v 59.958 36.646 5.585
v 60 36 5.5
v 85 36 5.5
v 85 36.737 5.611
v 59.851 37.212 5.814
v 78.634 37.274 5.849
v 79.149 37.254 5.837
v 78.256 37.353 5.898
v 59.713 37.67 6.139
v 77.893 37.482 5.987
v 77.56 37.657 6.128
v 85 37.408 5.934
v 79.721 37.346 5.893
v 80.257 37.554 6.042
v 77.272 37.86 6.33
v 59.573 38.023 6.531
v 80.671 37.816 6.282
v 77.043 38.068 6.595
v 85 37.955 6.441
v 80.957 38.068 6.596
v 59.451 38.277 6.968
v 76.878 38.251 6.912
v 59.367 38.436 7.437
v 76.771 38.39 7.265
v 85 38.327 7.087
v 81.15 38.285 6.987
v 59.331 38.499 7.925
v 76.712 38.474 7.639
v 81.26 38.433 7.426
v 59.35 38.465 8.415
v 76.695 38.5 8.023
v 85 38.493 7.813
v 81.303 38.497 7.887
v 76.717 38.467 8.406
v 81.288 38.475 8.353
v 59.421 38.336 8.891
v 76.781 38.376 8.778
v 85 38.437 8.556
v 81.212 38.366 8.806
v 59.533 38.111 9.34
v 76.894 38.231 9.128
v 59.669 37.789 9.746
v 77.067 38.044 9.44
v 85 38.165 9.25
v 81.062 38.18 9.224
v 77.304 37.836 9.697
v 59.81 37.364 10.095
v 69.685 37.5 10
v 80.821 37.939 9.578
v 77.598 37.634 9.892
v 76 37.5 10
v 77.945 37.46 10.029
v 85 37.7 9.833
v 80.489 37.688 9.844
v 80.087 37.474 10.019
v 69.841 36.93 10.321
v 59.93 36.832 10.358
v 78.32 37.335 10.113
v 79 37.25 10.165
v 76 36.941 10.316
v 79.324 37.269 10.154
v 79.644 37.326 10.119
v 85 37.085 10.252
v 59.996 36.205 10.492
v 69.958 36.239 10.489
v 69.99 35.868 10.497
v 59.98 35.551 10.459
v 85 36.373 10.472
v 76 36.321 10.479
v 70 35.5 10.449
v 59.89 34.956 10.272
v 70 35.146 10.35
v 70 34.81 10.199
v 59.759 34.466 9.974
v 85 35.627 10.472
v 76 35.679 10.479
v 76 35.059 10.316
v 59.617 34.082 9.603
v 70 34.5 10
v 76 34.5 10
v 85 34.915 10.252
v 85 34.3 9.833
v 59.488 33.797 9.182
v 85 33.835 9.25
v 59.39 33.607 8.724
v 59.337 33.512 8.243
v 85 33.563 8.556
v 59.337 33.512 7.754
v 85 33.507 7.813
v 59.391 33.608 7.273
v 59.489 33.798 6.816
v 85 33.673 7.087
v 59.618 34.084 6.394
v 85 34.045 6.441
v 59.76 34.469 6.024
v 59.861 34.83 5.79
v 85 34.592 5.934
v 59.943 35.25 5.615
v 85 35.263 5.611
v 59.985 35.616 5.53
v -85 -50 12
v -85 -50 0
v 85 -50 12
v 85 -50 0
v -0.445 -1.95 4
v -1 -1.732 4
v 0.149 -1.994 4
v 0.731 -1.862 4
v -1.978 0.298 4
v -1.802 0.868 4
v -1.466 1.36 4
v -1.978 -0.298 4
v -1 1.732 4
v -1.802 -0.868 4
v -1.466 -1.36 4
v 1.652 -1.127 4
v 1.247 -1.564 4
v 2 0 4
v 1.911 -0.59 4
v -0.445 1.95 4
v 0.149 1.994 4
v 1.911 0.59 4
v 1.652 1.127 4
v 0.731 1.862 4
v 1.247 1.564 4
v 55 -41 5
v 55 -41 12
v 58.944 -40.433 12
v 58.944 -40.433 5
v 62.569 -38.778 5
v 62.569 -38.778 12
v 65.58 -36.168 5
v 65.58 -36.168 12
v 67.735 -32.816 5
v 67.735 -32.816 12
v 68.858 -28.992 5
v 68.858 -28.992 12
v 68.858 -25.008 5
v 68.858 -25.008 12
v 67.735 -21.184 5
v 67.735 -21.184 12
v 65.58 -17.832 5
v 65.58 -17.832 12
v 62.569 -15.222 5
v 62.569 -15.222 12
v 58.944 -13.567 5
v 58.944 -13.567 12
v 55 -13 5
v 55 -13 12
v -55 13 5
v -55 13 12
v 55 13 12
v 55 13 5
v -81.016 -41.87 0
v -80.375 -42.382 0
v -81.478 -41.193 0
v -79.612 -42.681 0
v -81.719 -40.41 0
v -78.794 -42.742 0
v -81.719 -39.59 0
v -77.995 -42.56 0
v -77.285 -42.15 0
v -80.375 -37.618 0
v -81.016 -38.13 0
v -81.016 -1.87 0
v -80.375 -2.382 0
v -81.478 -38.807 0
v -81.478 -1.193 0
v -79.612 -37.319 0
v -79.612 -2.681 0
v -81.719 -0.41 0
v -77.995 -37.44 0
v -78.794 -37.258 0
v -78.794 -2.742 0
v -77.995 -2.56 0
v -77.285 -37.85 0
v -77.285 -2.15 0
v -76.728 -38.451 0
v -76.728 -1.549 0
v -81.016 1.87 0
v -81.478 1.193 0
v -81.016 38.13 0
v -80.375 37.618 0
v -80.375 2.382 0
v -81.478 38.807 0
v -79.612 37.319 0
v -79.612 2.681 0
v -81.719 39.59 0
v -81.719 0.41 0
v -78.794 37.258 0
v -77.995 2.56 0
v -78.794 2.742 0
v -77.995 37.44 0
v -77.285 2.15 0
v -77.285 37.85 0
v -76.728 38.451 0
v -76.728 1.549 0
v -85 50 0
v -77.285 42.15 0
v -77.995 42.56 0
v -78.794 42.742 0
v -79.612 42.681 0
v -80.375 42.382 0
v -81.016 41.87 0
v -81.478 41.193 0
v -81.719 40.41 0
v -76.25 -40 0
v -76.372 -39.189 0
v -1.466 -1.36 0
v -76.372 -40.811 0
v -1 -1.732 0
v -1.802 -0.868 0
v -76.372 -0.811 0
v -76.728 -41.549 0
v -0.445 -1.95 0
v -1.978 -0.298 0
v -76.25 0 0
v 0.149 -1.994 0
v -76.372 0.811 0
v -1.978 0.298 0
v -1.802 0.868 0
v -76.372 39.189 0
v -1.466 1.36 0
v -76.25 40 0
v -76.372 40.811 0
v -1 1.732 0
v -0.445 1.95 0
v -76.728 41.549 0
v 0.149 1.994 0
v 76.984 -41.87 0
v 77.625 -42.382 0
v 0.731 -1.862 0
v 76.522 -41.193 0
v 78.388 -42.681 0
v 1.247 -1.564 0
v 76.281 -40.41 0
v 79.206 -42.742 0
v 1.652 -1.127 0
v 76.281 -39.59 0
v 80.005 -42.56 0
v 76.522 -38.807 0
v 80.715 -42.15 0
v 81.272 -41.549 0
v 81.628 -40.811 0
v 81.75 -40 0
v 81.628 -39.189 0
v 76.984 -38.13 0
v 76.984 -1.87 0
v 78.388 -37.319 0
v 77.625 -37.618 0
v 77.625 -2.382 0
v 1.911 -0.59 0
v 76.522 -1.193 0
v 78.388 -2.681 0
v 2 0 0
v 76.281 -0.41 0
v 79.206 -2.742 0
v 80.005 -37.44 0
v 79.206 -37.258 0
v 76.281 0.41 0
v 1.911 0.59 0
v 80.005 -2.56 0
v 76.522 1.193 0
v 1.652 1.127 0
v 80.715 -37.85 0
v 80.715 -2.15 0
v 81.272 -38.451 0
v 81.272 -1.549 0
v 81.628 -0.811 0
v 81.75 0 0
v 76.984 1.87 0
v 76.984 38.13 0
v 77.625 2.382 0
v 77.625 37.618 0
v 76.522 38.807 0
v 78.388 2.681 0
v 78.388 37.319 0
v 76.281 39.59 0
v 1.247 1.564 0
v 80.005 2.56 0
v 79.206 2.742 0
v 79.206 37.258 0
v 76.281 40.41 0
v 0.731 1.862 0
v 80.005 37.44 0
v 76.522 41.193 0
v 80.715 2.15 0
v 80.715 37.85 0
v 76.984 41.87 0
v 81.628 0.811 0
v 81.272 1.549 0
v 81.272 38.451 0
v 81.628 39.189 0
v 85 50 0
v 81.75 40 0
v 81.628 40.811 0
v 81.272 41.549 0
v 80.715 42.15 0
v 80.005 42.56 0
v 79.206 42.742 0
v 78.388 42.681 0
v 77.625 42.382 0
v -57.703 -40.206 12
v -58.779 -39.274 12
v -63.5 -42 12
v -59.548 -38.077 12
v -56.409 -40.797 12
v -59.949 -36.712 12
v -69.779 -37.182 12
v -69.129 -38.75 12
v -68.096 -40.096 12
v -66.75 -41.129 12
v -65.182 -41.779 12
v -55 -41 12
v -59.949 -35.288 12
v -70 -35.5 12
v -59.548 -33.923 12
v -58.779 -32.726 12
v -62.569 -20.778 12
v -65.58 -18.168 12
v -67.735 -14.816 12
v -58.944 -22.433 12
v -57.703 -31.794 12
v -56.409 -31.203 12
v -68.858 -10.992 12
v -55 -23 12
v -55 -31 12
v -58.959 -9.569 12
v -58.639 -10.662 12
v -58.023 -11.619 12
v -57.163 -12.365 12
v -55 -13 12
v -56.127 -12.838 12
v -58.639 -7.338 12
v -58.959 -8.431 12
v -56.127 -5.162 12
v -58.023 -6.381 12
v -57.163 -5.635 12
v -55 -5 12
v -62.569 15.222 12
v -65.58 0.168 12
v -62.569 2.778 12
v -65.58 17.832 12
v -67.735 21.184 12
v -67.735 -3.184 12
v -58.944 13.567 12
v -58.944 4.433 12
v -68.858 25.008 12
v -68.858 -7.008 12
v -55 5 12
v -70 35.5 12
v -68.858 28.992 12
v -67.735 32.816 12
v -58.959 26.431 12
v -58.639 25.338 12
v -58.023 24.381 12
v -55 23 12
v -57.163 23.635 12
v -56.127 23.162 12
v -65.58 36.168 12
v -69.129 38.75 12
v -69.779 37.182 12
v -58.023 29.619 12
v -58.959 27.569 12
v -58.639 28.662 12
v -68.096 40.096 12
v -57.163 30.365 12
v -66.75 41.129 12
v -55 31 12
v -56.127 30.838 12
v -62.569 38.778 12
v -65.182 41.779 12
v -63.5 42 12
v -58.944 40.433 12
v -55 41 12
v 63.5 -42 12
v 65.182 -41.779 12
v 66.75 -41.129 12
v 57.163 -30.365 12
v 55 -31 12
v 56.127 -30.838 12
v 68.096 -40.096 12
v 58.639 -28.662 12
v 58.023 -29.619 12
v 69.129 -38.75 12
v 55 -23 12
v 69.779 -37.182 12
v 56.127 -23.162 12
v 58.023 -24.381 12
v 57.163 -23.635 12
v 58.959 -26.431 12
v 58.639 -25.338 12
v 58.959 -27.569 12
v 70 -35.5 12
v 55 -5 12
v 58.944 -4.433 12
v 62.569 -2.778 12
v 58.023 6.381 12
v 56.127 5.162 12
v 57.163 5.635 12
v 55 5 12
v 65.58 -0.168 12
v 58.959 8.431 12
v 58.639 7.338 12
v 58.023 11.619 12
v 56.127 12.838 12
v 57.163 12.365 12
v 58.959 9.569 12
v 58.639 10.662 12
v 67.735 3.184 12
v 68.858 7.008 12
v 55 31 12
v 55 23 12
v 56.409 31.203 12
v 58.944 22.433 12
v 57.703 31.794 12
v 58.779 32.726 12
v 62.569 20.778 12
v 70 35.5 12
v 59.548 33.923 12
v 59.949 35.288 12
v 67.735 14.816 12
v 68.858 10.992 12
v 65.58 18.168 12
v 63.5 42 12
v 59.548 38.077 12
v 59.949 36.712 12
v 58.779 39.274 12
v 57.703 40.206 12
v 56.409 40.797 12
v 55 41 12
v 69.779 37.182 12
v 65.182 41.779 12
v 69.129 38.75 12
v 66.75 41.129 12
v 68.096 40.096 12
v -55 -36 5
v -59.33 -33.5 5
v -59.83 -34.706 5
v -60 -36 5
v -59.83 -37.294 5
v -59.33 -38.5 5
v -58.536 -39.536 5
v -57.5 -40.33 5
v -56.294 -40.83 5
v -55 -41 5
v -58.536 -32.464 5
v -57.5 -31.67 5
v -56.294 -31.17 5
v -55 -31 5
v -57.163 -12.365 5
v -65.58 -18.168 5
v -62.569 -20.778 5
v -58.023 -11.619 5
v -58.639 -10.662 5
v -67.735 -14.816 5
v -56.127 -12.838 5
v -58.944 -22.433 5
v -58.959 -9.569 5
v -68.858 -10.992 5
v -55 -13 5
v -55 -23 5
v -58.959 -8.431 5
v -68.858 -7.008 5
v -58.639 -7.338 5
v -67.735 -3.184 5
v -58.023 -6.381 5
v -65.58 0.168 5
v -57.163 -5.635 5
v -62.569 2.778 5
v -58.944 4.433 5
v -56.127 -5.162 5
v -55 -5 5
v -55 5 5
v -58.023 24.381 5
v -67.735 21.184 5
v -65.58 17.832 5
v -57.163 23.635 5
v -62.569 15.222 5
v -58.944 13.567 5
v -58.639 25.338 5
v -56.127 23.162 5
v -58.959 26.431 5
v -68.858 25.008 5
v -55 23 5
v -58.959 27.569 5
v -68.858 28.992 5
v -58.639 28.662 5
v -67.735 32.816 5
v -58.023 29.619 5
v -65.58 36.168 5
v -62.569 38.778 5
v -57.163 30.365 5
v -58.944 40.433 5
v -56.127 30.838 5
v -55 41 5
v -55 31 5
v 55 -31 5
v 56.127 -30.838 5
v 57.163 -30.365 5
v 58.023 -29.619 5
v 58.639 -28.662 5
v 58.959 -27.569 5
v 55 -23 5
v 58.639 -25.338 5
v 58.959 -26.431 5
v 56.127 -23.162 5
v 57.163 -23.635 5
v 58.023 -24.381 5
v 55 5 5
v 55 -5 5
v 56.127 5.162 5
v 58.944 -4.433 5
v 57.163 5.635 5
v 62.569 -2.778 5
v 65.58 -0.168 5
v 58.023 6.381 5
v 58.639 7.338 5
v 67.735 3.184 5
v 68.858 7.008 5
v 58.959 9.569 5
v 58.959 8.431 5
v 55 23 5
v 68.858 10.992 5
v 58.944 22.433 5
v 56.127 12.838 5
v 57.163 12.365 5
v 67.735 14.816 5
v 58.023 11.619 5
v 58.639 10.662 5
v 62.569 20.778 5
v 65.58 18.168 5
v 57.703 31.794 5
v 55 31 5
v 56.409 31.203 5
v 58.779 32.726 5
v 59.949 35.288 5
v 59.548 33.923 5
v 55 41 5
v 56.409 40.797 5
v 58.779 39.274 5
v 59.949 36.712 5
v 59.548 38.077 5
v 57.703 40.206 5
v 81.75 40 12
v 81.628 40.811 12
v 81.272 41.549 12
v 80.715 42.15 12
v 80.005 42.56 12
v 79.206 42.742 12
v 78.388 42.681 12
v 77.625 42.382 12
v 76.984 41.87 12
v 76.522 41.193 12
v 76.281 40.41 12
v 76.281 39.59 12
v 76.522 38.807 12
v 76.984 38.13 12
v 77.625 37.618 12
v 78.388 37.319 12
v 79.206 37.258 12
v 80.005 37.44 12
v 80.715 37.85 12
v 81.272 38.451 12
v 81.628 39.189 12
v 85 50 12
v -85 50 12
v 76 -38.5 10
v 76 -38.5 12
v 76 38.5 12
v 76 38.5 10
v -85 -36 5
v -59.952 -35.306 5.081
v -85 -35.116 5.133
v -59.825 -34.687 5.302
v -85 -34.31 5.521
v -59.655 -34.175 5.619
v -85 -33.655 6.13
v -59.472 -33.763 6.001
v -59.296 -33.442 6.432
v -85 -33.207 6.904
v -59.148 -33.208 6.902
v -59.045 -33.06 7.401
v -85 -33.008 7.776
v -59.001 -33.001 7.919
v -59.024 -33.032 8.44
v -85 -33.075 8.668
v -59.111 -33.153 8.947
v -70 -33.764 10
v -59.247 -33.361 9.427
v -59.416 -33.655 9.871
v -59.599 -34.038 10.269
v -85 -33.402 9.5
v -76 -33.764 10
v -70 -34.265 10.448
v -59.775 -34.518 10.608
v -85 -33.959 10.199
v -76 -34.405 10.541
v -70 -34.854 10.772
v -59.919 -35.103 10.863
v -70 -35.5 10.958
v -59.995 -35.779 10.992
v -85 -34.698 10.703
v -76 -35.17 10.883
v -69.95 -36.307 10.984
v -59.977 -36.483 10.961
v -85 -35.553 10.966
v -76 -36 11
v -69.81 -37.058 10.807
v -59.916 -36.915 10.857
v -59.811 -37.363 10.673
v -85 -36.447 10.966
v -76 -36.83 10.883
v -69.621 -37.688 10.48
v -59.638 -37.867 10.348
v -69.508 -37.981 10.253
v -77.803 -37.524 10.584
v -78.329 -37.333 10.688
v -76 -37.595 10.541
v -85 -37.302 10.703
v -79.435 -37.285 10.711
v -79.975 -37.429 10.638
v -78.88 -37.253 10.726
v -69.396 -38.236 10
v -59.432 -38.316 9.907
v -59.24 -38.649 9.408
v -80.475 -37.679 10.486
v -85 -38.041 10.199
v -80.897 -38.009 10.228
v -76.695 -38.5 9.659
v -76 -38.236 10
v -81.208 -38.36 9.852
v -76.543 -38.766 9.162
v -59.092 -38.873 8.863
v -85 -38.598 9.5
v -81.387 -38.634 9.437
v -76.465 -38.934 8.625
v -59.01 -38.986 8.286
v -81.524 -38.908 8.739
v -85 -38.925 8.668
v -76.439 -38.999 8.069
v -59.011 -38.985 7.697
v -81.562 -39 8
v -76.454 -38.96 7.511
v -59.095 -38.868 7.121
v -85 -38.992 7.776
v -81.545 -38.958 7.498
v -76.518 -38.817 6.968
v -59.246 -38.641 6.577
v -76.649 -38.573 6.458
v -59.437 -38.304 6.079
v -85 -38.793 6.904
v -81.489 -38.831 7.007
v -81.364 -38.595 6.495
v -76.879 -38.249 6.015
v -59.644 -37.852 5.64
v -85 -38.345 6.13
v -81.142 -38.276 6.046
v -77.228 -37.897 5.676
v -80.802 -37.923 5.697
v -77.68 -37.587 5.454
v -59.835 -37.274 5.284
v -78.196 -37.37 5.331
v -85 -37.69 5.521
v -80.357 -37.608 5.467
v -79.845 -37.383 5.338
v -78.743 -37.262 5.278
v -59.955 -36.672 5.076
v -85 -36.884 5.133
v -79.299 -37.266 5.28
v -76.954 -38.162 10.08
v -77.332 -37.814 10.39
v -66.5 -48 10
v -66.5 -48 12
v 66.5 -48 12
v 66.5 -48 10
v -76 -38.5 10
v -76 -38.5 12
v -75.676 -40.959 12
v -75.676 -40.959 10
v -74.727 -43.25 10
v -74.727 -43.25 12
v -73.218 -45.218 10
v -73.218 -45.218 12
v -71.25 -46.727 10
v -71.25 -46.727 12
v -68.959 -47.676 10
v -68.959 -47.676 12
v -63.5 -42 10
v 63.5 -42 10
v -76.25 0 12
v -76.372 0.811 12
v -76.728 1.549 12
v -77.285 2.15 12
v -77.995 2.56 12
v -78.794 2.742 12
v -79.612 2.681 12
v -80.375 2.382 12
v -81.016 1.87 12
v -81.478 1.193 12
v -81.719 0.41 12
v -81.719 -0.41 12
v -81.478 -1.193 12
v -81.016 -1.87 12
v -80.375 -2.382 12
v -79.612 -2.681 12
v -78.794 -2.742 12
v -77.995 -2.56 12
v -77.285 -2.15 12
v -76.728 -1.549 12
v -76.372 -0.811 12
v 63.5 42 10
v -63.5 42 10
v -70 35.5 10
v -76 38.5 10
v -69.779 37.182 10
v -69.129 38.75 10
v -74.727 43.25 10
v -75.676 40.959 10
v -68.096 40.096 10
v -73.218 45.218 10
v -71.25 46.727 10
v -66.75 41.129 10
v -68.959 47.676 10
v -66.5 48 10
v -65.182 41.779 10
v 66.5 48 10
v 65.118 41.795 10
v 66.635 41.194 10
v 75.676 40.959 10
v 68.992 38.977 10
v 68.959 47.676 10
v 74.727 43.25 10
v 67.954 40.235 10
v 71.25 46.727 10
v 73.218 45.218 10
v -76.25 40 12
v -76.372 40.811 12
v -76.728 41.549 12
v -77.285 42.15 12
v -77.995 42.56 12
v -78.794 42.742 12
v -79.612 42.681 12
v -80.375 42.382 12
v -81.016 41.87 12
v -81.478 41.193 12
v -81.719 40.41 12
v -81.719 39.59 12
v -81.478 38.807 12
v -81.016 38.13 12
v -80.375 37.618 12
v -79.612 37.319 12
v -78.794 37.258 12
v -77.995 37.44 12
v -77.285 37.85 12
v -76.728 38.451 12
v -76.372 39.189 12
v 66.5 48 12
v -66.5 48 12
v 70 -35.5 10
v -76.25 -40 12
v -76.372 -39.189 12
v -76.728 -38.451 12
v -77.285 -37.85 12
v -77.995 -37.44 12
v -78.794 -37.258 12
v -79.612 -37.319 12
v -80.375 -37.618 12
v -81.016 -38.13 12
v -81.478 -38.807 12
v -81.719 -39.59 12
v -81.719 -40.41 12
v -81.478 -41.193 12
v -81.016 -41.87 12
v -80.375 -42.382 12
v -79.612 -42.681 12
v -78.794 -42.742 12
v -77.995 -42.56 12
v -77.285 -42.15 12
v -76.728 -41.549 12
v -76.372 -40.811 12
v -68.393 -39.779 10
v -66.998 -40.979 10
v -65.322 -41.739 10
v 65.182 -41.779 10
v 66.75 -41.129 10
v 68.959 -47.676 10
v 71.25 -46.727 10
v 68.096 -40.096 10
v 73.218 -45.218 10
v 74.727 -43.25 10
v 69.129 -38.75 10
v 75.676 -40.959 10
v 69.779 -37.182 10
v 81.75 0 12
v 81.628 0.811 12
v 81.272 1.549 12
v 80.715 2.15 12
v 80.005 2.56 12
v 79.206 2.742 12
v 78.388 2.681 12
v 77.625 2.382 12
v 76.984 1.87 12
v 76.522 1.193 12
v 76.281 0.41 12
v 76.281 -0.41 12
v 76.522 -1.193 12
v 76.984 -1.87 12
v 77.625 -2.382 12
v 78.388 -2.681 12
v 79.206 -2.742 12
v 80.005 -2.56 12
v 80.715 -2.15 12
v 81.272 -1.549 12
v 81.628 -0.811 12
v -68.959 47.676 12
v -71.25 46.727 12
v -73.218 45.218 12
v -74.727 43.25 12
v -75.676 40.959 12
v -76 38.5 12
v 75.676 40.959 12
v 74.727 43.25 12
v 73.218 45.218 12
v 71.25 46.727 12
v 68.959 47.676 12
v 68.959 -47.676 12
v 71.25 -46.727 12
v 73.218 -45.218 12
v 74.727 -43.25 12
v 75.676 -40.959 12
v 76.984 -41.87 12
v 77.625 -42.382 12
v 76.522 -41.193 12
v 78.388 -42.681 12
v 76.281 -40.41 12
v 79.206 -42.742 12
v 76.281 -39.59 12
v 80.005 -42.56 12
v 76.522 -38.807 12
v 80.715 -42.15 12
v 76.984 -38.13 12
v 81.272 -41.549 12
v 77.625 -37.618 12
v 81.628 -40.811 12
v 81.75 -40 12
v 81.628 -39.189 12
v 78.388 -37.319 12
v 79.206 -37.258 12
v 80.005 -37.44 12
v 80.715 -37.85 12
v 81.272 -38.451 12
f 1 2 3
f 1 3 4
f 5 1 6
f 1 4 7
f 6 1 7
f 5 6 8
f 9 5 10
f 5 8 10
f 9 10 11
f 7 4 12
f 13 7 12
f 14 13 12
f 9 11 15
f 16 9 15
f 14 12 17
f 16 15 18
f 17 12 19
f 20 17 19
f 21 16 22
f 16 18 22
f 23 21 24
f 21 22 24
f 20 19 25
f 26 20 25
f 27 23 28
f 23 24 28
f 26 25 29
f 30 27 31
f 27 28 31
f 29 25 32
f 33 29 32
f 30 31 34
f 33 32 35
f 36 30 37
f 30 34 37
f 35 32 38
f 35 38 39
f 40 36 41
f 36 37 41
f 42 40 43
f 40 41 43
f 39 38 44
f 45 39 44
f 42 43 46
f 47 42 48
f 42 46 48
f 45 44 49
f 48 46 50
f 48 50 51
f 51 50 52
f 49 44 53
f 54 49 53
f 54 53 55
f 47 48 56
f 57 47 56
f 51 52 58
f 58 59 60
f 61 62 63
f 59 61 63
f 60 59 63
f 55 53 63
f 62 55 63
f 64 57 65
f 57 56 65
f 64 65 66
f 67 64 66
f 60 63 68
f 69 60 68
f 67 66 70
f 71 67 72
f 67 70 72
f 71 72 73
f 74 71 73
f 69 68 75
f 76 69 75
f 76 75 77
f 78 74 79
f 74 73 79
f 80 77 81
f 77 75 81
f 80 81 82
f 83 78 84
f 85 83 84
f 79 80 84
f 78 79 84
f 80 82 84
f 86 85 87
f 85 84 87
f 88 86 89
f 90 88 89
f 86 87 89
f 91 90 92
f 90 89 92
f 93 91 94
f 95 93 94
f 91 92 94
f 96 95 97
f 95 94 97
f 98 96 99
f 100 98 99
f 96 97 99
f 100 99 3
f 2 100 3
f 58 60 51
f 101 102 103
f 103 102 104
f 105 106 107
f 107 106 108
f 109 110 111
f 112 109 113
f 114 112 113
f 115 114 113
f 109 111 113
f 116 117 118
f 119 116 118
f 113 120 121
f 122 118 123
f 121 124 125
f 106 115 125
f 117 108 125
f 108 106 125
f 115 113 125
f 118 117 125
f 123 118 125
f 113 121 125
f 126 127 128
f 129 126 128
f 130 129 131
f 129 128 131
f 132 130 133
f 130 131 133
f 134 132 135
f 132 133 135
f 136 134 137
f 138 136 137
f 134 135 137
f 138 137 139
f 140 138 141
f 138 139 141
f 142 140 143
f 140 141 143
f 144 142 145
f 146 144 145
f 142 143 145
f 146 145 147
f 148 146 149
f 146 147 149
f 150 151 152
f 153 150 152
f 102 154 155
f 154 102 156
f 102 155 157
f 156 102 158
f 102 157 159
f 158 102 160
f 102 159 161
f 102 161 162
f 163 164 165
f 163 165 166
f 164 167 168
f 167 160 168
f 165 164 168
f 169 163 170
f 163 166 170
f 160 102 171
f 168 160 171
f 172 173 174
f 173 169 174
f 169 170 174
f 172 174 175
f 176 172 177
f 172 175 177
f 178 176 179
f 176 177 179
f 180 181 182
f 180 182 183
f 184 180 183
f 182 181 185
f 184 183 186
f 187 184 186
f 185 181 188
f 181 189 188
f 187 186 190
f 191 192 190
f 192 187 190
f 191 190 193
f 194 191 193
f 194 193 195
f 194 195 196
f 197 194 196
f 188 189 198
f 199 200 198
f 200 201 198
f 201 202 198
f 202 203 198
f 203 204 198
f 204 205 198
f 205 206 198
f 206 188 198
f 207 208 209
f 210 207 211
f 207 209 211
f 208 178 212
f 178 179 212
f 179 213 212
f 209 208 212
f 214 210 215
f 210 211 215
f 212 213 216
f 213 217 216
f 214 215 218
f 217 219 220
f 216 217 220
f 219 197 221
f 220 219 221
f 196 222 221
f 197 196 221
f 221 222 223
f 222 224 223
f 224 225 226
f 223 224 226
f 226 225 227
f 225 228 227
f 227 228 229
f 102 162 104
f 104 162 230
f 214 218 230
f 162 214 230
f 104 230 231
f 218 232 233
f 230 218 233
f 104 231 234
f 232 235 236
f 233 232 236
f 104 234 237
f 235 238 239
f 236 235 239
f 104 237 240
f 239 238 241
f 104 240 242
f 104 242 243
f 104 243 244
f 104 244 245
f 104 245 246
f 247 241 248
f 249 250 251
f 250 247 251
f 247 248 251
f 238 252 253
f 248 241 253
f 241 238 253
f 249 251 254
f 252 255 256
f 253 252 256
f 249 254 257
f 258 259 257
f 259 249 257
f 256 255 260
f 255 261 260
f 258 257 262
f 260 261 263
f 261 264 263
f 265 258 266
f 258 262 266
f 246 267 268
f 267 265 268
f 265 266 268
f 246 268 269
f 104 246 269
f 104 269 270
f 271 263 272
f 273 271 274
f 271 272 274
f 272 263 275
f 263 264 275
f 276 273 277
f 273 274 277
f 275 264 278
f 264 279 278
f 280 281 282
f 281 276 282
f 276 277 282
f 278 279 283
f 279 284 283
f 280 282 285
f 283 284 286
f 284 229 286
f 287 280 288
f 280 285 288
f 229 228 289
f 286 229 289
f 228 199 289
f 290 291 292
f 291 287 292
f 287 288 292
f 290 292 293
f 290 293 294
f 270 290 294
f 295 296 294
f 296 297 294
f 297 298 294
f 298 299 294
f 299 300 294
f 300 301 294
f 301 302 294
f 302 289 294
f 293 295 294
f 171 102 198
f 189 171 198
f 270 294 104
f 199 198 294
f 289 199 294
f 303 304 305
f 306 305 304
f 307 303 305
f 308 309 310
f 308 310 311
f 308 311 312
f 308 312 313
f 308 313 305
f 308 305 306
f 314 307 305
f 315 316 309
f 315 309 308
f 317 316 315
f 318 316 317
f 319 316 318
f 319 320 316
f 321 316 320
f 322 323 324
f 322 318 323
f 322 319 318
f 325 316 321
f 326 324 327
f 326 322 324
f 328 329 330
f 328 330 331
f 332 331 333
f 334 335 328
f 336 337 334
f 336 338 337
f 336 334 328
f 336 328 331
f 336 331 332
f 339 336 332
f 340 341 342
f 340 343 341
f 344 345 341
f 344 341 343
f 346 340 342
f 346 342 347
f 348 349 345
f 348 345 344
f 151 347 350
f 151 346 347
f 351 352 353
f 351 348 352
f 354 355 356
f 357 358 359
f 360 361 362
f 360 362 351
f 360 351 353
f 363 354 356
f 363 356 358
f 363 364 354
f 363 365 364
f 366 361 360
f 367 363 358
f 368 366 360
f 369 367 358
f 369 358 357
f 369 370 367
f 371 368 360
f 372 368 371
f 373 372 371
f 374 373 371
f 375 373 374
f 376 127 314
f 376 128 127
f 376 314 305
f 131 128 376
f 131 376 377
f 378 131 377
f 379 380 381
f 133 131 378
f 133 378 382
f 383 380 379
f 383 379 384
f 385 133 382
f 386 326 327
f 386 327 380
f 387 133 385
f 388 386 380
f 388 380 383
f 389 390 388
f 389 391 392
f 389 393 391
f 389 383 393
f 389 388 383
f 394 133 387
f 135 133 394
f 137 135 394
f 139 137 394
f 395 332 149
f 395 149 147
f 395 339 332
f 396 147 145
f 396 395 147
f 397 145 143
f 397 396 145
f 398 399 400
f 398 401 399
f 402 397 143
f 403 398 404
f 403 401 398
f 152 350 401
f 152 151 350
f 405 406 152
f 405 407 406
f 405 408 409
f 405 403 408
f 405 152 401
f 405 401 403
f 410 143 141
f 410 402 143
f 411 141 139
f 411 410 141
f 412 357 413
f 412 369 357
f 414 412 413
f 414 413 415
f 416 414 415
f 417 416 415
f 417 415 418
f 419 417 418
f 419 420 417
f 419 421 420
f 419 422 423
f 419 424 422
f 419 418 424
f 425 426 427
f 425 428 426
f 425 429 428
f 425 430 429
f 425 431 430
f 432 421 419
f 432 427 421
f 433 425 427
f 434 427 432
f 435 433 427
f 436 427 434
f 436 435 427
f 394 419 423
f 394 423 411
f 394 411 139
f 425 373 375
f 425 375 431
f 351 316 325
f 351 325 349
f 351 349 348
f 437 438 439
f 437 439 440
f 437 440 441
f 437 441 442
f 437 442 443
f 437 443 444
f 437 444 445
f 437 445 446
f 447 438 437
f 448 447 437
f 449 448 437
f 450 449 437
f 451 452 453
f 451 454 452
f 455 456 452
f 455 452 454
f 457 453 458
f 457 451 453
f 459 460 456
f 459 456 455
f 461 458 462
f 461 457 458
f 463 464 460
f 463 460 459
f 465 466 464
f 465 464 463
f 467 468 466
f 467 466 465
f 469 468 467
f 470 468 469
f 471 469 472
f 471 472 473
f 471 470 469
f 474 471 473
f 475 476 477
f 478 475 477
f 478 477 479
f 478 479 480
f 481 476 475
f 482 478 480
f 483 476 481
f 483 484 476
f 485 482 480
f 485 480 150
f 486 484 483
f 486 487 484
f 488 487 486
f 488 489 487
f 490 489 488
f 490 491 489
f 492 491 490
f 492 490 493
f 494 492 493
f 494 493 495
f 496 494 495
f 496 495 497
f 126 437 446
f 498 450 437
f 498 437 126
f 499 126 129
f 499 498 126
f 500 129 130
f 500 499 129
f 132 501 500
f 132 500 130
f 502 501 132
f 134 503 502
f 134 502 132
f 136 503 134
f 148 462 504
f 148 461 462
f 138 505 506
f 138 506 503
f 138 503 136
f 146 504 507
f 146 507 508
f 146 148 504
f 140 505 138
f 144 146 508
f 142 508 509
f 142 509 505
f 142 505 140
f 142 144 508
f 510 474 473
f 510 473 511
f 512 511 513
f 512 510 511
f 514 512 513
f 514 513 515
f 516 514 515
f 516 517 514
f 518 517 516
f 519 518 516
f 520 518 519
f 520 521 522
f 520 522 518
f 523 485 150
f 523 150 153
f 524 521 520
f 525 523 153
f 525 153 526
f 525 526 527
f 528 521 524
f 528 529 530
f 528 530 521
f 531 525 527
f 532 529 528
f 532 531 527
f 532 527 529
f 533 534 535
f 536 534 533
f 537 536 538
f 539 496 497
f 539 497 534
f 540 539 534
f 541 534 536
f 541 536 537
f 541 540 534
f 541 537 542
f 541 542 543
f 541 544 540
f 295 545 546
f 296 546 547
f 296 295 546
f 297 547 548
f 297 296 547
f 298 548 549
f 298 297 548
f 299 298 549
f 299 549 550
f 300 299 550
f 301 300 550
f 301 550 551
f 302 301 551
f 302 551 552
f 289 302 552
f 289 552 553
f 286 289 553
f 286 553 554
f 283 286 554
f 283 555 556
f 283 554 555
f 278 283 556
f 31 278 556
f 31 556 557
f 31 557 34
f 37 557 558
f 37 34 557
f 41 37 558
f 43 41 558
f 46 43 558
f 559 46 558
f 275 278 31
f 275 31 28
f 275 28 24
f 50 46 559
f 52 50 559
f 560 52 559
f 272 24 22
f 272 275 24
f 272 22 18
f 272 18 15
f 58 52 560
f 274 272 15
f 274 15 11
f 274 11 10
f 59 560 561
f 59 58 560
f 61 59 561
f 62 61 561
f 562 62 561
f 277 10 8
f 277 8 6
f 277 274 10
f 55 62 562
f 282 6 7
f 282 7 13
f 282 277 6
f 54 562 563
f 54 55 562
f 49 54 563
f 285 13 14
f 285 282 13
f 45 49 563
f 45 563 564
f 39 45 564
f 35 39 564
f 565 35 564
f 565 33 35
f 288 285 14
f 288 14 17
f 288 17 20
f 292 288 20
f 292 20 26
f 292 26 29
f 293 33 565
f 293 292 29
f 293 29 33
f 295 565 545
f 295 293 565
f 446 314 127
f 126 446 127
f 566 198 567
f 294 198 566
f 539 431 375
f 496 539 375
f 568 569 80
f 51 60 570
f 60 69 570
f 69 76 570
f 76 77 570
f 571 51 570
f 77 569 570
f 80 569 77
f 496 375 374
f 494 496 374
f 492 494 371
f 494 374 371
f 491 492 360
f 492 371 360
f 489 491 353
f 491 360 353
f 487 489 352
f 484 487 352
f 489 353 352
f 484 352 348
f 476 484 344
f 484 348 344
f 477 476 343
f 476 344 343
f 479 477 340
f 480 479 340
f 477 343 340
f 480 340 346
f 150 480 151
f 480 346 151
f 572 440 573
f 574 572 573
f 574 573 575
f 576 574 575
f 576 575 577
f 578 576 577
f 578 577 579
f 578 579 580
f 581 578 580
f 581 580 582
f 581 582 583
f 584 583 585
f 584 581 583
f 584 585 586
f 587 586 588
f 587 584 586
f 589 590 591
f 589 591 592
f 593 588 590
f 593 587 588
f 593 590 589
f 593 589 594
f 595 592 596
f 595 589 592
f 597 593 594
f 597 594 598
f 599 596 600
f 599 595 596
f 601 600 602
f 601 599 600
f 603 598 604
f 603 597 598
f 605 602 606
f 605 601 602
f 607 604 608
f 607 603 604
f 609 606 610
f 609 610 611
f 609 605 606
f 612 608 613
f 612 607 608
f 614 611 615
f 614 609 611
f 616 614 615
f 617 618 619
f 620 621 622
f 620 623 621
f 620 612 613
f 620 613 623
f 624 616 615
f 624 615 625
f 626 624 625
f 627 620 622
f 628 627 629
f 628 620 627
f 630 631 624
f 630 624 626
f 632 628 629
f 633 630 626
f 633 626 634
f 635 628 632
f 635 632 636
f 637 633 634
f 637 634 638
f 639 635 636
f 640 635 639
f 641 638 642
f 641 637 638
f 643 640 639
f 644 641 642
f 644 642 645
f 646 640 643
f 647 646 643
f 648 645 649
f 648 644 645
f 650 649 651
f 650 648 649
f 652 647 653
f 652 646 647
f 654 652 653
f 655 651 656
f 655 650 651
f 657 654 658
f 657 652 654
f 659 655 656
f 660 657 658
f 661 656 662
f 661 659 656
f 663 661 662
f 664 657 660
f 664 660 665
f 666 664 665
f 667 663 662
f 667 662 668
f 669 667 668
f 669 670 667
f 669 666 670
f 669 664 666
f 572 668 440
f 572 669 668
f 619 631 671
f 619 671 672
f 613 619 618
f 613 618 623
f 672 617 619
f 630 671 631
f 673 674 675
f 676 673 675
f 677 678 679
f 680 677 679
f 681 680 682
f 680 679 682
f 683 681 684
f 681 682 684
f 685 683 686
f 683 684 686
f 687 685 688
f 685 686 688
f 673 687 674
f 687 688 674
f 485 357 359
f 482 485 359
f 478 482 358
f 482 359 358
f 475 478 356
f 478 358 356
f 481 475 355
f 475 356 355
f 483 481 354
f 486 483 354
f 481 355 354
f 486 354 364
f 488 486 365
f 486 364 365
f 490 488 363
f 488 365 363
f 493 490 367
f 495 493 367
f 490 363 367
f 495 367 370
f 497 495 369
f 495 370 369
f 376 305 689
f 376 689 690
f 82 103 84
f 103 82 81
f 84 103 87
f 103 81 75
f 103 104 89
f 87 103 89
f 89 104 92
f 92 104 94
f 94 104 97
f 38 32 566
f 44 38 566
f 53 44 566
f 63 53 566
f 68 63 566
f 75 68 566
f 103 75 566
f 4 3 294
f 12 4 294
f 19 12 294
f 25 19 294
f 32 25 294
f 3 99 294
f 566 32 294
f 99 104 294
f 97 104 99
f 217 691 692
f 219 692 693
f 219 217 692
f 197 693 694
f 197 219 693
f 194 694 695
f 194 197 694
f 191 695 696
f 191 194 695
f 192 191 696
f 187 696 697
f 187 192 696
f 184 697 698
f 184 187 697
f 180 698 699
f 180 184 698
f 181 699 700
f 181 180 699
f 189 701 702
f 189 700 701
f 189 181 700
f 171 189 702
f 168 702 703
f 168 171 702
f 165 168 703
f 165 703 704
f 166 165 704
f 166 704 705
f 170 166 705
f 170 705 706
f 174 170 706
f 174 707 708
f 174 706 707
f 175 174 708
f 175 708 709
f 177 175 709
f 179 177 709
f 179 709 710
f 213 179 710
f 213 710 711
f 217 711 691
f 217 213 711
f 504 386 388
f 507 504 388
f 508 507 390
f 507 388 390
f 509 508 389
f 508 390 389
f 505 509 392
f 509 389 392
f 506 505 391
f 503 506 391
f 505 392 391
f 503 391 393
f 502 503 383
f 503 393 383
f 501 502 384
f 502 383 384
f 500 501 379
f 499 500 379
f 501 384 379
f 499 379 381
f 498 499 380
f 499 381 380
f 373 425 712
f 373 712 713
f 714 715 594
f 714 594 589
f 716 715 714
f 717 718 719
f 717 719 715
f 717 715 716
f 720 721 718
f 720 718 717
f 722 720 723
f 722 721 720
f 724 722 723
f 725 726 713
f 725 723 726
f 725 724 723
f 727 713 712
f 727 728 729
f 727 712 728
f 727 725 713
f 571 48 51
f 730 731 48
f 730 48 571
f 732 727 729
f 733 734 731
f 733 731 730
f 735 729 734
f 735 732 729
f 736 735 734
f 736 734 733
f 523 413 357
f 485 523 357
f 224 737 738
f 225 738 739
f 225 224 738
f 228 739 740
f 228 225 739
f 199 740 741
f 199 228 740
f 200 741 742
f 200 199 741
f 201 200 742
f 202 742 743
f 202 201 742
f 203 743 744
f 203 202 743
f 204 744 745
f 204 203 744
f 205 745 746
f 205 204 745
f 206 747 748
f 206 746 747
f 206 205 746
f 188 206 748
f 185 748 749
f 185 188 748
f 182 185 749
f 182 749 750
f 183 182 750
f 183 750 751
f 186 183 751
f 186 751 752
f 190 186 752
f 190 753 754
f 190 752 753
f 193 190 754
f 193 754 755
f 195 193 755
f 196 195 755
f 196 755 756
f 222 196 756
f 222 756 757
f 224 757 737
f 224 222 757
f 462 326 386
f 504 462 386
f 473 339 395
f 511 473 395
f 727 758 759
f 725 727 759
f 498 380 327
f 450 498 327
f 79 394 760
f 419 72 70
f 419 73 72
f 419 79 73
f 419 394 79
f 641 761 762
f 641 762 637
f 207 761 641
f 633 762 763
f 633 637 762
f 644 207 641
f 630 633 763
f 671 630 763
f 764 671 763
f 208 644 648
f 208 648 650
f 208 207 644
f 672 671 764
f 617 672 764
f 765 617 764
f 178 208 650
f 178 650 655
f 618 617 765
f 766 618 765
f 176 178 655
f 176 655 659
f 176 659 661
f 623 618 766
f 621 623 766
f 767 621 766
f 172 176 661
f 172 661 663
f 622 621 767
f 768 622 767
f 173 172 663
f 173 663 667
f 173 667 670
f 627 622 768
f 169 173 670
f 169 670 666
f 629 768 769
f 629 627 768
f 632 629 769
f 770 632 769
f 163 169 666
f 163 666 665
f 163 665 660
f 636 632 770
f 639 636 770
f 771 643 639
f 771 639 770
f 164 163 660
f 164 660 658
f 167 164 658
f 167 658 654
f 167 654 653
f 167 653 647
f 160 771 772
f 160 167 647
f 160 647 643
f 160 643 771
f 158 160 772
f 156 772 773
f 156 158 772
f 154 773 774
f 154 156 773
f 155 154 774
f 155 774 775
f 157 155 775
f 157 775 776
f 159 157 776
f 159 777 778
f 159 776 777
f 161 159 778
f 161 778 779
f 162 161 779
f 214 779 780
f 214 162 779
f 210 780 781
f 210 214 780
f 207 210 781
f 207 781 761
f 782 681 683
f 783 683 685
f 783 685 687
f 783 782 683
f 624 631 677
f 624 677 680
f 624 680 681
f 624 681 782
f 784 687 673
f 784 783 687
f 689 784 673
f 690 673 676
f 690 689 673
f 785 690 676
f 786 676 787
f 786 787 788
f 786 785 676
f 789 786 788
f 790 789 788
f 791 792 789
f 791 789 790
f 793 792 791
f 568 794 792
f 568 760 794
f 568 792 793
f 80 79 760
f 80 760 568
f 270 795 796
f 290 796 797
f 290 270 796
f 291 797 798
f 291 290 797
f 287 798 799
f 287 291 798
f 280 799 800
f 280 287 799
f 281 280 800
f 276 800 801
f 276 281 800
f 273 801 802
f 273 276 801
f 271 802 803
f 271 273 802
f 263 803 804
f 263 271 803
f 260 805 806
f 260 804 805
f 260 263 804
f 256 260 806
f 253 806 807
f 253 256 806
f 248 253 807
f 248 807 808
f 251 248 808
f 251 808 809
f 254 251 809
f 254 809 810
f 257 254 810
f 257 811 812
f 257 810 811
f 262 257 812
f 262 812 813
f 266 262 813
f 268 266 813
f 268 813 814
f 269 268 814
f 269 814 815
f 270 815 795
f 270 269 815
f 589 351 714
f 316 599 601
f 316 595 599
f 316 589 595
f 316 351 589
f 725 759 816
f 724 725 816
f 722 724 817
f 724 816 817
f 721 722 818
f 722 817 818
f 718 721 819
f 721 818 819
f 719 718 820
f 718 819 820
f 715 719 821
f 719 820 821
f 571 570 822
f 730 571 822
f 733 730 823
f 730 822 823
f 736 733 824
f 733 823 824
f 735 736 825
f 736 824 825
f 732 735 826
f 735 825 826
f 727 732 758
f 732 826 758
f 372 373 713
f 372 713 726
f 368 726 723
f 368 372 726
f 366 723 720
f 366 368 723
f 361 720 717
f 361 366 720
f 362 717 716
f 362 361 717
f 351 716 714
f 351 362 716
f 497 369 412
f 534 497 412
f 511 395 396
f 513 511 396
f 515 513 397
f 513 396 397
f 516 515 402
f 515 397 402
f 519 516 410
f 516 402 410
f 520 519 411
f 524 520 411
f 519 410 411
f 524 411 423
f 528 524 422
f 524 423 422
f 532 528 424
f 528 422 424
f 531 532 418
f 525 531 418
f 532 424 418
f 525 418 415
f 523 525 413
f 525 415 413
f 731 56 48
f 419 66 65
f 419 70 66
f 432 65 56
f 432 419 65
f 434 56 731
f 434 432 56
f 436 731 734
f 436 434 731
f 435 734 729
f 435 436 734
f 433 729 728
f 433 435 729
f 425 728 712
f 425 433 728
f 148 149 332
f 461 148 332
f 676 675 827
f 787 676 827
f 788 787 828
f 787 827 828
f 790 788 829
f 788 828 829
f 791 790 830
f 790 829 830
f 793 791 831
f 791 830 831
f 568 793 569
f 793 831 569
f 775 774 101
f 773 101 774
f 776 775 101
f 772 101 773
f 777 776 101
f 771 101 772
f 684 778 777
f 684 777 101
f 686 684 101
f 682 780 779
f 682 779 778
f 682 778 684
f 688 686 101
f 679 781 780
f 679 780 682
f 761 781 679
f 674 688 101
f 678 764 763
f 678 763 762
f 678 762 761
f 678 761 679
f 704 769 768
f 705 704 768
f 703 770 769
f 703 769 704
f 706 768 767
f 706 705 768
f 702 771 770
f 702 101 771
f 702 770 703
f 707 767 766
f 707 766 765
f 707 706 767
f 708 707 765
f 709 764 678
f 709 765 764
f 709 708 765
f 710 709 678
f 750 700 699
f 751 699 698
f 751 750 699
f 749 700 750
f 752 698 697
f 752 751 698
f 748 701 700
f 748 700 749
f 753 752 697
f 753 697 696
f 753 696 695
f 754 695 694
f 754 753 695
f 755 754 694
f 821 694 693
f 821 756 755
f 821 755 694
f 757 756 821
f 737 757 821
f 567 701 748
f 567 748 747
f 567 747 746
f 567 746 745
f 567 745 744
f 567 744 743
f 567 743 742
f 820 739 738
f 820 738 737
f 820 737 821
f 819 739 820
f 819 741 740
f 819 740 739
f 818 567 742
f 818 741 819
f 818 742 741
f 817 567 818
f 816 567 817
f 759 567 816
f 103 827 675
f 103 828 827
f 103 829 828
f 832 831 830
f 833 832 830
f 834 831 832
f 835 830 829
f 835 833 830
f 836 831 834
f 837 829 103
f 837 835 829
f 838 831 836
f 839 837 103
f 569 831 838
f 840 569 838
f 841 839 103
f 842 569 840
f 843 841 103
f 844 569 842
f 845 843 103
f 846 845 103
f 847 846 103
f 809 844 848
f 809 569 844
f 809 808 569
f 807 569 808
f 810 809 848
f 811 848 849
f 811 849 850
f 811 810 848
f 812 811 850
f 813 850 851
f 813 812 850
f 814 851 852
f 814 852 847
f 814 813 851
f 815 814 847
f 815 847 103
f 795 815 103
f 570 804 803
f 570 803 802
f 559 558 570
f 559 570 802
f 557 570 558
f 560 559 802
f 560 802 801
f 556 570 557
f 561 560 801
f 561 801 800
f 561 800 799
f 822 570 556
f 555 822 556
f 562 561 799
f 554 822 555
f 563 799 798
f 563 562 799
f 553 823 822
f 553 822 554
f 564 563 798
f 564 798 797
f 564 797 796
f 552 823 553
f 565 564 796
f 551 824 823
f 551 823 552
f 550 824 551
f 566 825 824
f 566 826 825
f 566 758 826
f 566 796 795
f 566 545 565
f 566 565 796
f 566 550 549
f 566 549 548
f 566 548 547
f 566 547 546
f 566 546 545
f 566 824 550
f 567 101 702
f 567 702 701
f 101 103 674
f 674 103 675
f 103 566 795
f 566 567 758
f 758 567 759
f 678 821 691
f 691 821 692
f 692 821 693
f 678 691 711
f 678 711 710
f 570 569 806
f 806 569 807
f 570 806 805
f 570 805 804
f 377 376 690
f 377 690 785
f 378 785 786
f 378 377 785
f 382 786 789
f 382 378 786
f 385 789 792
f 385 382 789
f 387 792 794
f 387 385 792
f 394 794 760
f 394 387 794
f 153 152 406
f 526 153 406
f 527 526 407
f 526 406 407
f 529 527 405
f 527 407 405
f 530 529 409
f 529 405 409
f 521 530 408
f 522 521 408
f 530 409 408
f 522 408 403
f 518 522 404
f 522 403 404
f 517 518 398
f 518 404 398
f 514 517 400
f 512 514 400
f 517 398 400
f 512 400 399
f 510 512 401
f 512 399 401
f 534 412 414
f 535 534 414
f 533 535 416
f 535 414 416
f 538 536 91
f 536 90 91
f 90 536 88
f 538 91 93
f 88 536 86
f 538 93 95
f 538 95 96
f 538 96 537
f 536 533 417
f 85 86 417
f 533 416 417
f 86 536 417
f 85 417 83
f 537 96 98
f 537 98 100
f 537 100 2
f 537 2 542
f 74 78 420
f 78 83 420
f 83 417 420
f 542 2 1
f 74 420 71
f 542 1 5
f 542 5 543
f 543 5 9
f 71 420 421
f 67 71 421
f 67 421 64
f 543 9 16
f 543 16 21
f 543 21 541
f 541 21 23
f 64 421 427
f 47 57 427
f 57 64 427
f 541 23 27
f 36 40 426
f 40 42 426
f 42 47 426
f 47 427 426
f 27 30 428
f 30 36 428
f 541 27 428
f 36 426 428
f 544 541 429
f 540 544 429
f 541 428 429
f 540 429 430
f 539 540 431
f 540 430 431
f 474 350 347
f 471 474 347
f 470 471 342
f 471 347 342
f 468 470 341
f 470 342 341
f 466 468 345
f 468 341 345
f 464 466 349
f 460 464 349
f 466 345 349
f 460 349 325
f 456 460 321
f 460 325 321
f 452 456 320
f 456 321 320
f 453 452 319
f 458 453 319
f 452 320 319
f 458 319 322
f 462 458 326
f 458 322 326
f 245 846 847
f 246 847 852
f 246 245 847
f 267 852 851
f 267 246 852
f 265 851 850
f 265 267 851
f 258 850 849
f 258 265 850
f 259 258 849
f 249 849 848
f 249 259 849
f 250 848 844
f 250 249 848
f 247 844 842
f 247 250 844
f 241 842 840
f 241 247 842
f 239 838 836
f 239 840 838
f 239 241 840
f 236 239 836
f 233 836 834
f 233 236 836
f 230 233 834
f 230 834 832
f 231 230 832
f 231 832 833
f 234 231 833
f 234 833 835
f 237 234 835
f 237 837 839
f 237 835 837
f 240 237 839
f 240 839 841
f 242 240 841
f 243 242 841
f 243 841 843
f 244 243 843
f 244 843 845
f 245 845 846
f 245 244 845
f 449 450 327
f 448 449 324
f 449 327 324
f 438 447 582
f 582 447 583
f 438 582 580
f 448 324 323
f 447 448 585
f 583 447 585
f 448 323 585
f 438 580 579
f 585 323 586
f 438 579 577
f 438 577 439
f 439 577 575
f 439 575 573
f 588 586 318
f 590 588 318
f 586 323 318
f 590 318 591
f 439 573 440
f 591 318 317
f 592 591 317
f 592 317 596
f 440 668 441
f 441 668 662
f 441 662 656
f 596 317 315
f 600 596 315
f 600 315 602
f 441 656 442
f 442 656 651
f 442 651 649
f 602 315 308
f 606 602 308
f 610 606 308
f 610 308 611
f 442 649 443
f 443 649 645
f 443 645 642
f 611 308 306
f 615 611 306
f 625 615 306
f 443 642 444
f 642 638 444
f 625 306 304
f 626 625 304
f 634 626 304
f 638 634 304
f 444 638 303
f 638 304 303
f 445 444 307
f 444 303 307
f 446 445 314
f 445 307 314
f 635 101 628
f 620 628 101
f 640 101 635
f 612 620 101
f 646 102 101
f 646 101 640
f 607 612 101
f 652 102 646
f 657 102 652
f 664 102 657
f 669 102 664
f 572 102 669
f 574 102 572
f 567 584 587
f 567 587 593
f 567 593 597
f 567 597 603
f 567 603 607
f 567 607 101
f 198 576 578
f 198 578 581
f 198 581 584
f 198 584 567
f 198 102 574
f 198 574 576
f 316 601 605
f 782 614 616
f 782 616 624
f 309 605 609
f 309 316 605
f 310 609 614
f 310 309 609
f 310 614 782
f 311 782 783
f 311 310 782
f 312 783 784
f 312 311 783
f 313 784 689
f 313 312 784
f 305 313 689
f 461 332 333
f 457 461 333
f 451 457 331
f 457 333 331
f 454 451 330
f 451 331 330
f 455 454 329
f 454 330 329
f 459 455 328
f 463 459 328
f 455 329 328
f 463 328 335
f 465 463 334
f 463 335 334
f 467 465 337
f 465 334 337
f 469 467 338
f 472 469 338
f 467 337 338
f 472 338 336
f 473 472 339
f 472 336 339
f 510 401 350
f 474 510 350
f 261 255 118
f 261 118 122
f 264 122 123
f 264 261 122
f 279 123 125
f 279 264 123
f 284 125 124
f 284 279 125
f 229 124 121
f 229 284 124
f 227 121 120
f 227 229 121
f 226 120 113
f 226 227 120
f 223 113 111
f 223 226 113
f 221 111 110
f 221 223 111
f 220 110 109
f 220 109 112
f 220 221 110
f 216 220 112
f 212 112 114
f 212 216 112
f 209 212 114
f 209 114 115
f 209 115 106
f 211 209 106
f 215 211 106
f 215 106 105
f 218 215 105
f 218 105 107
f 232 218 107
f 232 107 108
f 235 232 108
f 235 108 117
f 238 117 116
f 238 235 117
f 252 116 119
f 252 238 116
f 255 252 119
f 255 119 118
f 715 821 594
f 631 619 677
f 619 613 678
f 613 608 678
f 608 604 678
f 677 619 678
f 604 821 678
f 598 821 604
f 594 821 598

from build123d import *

# Parameters (mm, degrees)
SKETCH_1_W          = 170
SKETCH_1_H          = 100
EXTRUDE_1_DEPTH     = 12
CUT_EXTRUDE_1_DEPTH = 7
CUT_EXTRUDE_2_DEPTH = 7
CUT_EXTRUDE_3_DEPTH = 2
SKETCH_5_R          = 2.75
CUT_EXTRUDE_4_DEPTH = 100.342840708
SKETCH_6_R          = 3
CUT_EXTRUDE_5_DEPTH = 30
SKETCH_7_R          = 2.5
CUT_EXTRUDE_6_DEPTH = 30
SKETCH_8_R          = 2
CUT_EXTRUDE_7_DEPTH = 4


with BuildPart() as part:
    # 草图1 → 凸台-拉伸1 (new body)
    with BuildSketch(Plane.XY):
        Rectangle(SKETCH_1_W, SKETCH_1_H)
    extrude(amount=EXTRUDE_1_DEPTH)

    # 草图2 → 切除-拉伸1 (cut)
    with BuildSketch(Plane.XY.offset(12)):
        with BuildLine():
            Line((-55, -41), (55, -41))
            ThreePointArc((55, -41), (60, -36), (55, -31))
            Line((55, -31), (-55, -31))
            ThreePointArc((-55, -31), (-60, -36), (-55, -41))
        make_face()
        with BuildLine():
            Line((-55, -23), (55, -23))
            ThreePointArc((55, -23), (60, -18), (55, -13))
            Line((55, -13), (-55, -13))
            ThreePointArc((-55, -13), (-60, -18), (-55, -23))
        make_face()
        with BuildLine():
            Line((-55, -5), (55, -5))
            ThreePointArc((55, -5), (60, 0), (55, 5))
            Line((55, 5), (-55, 5))
            ThreePointArc((-55, 5), (-60, 0), (-55, -5))
        make_face()
        with BuildLine():
            Line((-55, 13), (55, 13))
            ThreePointArc((55, 13), (60, 18), (55, 23))
            Line((55, 23), (-55, 23))
            ThreePointArc((-55, 23), (-60, 18), (-55, 13))
        make_face()
        with BuildLine():
            Line((-55, 31), (55, 31))
            ThreePointArc((55, 31), (60, 36), (55, 41))
            Line((55, 41), (-55, 41))
            ThreePointArc((-55, 41), (-60, 36), (-55, 31))
        make_face()
    extrude(amount=-CUT_EXTRUDE_1_DEPTH, mode=Mode.SUBTRACT)

    # 草图3 → 切除-拉伸2 (cut)
    with BuildSketch(Plane.XY.offset(12)):
        with BuildLine():
            Line((55, -13), (55, -23))
            ThreePointArc((55, -23), (59, -27), (55, -31))
            Line((55, -31), (55, -41))
            ThreePointArc((55, -41), (69, -27), (55, -13))
        make_face()
        with BuildLine():
            Line((-55, -23), (-55, -13))
            ThreePointArc((-55, -13), (-59, -9), (-55, -5))
            Line((-55, -5), (-55, 5))
            ThreePointArc((-55, 5), (-69, -9), (-55, -23))
        make_face()
        with BuildLine():
            Line((55, 23), (55, 13))
            ThreePointArc((55, 13), (59, 9), (55, 5))
            Line((55, 5), (55, -5))
            ThreePointArc((55, -5), (69, 9), (55, 23))
        make_face()
        with BuildLine():
            Line((-55, 13), (-55, 23))
            ThreePointArc((-55, 23), (-59, 27), (-55, 31))
            Line((-55, 31), (-55, 41))
            ThreePointArc((-55, 41), (-69, 27), (-55, 13))
        make_face()
    extrude(amount=-CUT_EXTRUDE_2_DEPTH, mode=Mode.SUBTRACT)

    # 草图4 → 切除-拉伸3 (cut)
    with BuildSketch(Plane.XY.offset(12)):
        with BuildLine():
            Line((-66.5, -48), (66.5, -48))
            ThreePointArc((66.5, -48), (73.217514421, -45.217514421), (76, -38.5))
            Line((76, -38.5), (76, 38.5))
            ThreePointArc((76, 38.5), (73.217514421, 45.217514421), (66.5, 48))
            Line((66.5, 48), (-66.5, 48))
            ThreePointArc((-66.5, 48), (-73.217514421, 45.217514421), (-76, 38.5))
            Line((-76, 38.5), (-76, -38.5))
            ThreePointArc((-76, -38.5), (-73.217514421, -45.217514421), (-66.5, -48))
        make_face()
        with BuildLine():
            Line((-63.5, -42), (63.5, -42))
            ThreePointArc((63.5, -42), (68.096194078, -40.096194078), (70, -35.5))
            Line((70, -35.5), (70, 35.5))
            ThreePointArc((70, 35.5), (68.096194078, 40.096194078), (63.5, 42))
            Line((63.5, 42), (-63.5, 42))
            ThreePointArc((-63.5, 42), (-68.096194078, 40.096194078), (-70, 35.5))
            Line((-70, 35.5), (-70, -35.5))
            ThreePointArc((-70, -35.5), (-68.096194078, -40.096194078), (-63.5, -42))
        make_face(mode=Mode.SUBTRACT)
    extrude(amount=-CUT_EXTRUDE_3_DEPTH, mode=Mode.SUBTRACT)

    # 草图5 → 切除-拉伸4 (cut, through all)
    with BuildSketch(Plane.XY):
        with Locations((-79, -40)):
            Circle(SKETCH_5_R)
        with Locations((-79, 0)):
            Circle(SKETCH_5_R)
        with Locations((-79, 40)):
            Circle(SKETCH_5_R)
        with Locations((79, -40)):
            Circle(SKETCH_5_R)
        with Locations((79, 0)):
            Circle(SKETCH_5_R)
        with Locations((79, 40)):
            Circle(SKETCH_5_R)
    extrude(amount=CUT_EXTRUDE_4_DEPTH, mode=Mode.SUBTRACT)

    # 草图6 → 切除-拉伸5 (cut)
    with BuildSketch(Plane(origin=(-85, 0, 0), x_dir=(0, 0, -1), z_dir=(1, 0, 0))):
        with Locations((-8, -36)):
            Circle(SKETCH_6_R)
    extrude(amount=CUT_EXTRUDE_5_DEPTH, mode=Mode.SUBTRACT)

    # 草图7 → 切除-拉伸6 (cut)
    with BuildSketch(Plane(origin=(85, 0, 0), x_dir=(0, 0, -1), z_dir=(1, 0, 0))):
        with Locations((-8, 36)):
            Circle(SKETCH_7_R)
    extrude(amount=-CUT_EXTRUDE_6_DEPTH, mode=Mode.SUBTRACT)

    # 草图8 → 切除-拉伸7 (cut)
    with BuildSketch(Plane.XY):
        Circle(SKETCH_8_R)
    extrude(amount=CUT_EXTRUDE_7_DEPTH, mode=Mode.SUBTRACT)


solid = part.part
